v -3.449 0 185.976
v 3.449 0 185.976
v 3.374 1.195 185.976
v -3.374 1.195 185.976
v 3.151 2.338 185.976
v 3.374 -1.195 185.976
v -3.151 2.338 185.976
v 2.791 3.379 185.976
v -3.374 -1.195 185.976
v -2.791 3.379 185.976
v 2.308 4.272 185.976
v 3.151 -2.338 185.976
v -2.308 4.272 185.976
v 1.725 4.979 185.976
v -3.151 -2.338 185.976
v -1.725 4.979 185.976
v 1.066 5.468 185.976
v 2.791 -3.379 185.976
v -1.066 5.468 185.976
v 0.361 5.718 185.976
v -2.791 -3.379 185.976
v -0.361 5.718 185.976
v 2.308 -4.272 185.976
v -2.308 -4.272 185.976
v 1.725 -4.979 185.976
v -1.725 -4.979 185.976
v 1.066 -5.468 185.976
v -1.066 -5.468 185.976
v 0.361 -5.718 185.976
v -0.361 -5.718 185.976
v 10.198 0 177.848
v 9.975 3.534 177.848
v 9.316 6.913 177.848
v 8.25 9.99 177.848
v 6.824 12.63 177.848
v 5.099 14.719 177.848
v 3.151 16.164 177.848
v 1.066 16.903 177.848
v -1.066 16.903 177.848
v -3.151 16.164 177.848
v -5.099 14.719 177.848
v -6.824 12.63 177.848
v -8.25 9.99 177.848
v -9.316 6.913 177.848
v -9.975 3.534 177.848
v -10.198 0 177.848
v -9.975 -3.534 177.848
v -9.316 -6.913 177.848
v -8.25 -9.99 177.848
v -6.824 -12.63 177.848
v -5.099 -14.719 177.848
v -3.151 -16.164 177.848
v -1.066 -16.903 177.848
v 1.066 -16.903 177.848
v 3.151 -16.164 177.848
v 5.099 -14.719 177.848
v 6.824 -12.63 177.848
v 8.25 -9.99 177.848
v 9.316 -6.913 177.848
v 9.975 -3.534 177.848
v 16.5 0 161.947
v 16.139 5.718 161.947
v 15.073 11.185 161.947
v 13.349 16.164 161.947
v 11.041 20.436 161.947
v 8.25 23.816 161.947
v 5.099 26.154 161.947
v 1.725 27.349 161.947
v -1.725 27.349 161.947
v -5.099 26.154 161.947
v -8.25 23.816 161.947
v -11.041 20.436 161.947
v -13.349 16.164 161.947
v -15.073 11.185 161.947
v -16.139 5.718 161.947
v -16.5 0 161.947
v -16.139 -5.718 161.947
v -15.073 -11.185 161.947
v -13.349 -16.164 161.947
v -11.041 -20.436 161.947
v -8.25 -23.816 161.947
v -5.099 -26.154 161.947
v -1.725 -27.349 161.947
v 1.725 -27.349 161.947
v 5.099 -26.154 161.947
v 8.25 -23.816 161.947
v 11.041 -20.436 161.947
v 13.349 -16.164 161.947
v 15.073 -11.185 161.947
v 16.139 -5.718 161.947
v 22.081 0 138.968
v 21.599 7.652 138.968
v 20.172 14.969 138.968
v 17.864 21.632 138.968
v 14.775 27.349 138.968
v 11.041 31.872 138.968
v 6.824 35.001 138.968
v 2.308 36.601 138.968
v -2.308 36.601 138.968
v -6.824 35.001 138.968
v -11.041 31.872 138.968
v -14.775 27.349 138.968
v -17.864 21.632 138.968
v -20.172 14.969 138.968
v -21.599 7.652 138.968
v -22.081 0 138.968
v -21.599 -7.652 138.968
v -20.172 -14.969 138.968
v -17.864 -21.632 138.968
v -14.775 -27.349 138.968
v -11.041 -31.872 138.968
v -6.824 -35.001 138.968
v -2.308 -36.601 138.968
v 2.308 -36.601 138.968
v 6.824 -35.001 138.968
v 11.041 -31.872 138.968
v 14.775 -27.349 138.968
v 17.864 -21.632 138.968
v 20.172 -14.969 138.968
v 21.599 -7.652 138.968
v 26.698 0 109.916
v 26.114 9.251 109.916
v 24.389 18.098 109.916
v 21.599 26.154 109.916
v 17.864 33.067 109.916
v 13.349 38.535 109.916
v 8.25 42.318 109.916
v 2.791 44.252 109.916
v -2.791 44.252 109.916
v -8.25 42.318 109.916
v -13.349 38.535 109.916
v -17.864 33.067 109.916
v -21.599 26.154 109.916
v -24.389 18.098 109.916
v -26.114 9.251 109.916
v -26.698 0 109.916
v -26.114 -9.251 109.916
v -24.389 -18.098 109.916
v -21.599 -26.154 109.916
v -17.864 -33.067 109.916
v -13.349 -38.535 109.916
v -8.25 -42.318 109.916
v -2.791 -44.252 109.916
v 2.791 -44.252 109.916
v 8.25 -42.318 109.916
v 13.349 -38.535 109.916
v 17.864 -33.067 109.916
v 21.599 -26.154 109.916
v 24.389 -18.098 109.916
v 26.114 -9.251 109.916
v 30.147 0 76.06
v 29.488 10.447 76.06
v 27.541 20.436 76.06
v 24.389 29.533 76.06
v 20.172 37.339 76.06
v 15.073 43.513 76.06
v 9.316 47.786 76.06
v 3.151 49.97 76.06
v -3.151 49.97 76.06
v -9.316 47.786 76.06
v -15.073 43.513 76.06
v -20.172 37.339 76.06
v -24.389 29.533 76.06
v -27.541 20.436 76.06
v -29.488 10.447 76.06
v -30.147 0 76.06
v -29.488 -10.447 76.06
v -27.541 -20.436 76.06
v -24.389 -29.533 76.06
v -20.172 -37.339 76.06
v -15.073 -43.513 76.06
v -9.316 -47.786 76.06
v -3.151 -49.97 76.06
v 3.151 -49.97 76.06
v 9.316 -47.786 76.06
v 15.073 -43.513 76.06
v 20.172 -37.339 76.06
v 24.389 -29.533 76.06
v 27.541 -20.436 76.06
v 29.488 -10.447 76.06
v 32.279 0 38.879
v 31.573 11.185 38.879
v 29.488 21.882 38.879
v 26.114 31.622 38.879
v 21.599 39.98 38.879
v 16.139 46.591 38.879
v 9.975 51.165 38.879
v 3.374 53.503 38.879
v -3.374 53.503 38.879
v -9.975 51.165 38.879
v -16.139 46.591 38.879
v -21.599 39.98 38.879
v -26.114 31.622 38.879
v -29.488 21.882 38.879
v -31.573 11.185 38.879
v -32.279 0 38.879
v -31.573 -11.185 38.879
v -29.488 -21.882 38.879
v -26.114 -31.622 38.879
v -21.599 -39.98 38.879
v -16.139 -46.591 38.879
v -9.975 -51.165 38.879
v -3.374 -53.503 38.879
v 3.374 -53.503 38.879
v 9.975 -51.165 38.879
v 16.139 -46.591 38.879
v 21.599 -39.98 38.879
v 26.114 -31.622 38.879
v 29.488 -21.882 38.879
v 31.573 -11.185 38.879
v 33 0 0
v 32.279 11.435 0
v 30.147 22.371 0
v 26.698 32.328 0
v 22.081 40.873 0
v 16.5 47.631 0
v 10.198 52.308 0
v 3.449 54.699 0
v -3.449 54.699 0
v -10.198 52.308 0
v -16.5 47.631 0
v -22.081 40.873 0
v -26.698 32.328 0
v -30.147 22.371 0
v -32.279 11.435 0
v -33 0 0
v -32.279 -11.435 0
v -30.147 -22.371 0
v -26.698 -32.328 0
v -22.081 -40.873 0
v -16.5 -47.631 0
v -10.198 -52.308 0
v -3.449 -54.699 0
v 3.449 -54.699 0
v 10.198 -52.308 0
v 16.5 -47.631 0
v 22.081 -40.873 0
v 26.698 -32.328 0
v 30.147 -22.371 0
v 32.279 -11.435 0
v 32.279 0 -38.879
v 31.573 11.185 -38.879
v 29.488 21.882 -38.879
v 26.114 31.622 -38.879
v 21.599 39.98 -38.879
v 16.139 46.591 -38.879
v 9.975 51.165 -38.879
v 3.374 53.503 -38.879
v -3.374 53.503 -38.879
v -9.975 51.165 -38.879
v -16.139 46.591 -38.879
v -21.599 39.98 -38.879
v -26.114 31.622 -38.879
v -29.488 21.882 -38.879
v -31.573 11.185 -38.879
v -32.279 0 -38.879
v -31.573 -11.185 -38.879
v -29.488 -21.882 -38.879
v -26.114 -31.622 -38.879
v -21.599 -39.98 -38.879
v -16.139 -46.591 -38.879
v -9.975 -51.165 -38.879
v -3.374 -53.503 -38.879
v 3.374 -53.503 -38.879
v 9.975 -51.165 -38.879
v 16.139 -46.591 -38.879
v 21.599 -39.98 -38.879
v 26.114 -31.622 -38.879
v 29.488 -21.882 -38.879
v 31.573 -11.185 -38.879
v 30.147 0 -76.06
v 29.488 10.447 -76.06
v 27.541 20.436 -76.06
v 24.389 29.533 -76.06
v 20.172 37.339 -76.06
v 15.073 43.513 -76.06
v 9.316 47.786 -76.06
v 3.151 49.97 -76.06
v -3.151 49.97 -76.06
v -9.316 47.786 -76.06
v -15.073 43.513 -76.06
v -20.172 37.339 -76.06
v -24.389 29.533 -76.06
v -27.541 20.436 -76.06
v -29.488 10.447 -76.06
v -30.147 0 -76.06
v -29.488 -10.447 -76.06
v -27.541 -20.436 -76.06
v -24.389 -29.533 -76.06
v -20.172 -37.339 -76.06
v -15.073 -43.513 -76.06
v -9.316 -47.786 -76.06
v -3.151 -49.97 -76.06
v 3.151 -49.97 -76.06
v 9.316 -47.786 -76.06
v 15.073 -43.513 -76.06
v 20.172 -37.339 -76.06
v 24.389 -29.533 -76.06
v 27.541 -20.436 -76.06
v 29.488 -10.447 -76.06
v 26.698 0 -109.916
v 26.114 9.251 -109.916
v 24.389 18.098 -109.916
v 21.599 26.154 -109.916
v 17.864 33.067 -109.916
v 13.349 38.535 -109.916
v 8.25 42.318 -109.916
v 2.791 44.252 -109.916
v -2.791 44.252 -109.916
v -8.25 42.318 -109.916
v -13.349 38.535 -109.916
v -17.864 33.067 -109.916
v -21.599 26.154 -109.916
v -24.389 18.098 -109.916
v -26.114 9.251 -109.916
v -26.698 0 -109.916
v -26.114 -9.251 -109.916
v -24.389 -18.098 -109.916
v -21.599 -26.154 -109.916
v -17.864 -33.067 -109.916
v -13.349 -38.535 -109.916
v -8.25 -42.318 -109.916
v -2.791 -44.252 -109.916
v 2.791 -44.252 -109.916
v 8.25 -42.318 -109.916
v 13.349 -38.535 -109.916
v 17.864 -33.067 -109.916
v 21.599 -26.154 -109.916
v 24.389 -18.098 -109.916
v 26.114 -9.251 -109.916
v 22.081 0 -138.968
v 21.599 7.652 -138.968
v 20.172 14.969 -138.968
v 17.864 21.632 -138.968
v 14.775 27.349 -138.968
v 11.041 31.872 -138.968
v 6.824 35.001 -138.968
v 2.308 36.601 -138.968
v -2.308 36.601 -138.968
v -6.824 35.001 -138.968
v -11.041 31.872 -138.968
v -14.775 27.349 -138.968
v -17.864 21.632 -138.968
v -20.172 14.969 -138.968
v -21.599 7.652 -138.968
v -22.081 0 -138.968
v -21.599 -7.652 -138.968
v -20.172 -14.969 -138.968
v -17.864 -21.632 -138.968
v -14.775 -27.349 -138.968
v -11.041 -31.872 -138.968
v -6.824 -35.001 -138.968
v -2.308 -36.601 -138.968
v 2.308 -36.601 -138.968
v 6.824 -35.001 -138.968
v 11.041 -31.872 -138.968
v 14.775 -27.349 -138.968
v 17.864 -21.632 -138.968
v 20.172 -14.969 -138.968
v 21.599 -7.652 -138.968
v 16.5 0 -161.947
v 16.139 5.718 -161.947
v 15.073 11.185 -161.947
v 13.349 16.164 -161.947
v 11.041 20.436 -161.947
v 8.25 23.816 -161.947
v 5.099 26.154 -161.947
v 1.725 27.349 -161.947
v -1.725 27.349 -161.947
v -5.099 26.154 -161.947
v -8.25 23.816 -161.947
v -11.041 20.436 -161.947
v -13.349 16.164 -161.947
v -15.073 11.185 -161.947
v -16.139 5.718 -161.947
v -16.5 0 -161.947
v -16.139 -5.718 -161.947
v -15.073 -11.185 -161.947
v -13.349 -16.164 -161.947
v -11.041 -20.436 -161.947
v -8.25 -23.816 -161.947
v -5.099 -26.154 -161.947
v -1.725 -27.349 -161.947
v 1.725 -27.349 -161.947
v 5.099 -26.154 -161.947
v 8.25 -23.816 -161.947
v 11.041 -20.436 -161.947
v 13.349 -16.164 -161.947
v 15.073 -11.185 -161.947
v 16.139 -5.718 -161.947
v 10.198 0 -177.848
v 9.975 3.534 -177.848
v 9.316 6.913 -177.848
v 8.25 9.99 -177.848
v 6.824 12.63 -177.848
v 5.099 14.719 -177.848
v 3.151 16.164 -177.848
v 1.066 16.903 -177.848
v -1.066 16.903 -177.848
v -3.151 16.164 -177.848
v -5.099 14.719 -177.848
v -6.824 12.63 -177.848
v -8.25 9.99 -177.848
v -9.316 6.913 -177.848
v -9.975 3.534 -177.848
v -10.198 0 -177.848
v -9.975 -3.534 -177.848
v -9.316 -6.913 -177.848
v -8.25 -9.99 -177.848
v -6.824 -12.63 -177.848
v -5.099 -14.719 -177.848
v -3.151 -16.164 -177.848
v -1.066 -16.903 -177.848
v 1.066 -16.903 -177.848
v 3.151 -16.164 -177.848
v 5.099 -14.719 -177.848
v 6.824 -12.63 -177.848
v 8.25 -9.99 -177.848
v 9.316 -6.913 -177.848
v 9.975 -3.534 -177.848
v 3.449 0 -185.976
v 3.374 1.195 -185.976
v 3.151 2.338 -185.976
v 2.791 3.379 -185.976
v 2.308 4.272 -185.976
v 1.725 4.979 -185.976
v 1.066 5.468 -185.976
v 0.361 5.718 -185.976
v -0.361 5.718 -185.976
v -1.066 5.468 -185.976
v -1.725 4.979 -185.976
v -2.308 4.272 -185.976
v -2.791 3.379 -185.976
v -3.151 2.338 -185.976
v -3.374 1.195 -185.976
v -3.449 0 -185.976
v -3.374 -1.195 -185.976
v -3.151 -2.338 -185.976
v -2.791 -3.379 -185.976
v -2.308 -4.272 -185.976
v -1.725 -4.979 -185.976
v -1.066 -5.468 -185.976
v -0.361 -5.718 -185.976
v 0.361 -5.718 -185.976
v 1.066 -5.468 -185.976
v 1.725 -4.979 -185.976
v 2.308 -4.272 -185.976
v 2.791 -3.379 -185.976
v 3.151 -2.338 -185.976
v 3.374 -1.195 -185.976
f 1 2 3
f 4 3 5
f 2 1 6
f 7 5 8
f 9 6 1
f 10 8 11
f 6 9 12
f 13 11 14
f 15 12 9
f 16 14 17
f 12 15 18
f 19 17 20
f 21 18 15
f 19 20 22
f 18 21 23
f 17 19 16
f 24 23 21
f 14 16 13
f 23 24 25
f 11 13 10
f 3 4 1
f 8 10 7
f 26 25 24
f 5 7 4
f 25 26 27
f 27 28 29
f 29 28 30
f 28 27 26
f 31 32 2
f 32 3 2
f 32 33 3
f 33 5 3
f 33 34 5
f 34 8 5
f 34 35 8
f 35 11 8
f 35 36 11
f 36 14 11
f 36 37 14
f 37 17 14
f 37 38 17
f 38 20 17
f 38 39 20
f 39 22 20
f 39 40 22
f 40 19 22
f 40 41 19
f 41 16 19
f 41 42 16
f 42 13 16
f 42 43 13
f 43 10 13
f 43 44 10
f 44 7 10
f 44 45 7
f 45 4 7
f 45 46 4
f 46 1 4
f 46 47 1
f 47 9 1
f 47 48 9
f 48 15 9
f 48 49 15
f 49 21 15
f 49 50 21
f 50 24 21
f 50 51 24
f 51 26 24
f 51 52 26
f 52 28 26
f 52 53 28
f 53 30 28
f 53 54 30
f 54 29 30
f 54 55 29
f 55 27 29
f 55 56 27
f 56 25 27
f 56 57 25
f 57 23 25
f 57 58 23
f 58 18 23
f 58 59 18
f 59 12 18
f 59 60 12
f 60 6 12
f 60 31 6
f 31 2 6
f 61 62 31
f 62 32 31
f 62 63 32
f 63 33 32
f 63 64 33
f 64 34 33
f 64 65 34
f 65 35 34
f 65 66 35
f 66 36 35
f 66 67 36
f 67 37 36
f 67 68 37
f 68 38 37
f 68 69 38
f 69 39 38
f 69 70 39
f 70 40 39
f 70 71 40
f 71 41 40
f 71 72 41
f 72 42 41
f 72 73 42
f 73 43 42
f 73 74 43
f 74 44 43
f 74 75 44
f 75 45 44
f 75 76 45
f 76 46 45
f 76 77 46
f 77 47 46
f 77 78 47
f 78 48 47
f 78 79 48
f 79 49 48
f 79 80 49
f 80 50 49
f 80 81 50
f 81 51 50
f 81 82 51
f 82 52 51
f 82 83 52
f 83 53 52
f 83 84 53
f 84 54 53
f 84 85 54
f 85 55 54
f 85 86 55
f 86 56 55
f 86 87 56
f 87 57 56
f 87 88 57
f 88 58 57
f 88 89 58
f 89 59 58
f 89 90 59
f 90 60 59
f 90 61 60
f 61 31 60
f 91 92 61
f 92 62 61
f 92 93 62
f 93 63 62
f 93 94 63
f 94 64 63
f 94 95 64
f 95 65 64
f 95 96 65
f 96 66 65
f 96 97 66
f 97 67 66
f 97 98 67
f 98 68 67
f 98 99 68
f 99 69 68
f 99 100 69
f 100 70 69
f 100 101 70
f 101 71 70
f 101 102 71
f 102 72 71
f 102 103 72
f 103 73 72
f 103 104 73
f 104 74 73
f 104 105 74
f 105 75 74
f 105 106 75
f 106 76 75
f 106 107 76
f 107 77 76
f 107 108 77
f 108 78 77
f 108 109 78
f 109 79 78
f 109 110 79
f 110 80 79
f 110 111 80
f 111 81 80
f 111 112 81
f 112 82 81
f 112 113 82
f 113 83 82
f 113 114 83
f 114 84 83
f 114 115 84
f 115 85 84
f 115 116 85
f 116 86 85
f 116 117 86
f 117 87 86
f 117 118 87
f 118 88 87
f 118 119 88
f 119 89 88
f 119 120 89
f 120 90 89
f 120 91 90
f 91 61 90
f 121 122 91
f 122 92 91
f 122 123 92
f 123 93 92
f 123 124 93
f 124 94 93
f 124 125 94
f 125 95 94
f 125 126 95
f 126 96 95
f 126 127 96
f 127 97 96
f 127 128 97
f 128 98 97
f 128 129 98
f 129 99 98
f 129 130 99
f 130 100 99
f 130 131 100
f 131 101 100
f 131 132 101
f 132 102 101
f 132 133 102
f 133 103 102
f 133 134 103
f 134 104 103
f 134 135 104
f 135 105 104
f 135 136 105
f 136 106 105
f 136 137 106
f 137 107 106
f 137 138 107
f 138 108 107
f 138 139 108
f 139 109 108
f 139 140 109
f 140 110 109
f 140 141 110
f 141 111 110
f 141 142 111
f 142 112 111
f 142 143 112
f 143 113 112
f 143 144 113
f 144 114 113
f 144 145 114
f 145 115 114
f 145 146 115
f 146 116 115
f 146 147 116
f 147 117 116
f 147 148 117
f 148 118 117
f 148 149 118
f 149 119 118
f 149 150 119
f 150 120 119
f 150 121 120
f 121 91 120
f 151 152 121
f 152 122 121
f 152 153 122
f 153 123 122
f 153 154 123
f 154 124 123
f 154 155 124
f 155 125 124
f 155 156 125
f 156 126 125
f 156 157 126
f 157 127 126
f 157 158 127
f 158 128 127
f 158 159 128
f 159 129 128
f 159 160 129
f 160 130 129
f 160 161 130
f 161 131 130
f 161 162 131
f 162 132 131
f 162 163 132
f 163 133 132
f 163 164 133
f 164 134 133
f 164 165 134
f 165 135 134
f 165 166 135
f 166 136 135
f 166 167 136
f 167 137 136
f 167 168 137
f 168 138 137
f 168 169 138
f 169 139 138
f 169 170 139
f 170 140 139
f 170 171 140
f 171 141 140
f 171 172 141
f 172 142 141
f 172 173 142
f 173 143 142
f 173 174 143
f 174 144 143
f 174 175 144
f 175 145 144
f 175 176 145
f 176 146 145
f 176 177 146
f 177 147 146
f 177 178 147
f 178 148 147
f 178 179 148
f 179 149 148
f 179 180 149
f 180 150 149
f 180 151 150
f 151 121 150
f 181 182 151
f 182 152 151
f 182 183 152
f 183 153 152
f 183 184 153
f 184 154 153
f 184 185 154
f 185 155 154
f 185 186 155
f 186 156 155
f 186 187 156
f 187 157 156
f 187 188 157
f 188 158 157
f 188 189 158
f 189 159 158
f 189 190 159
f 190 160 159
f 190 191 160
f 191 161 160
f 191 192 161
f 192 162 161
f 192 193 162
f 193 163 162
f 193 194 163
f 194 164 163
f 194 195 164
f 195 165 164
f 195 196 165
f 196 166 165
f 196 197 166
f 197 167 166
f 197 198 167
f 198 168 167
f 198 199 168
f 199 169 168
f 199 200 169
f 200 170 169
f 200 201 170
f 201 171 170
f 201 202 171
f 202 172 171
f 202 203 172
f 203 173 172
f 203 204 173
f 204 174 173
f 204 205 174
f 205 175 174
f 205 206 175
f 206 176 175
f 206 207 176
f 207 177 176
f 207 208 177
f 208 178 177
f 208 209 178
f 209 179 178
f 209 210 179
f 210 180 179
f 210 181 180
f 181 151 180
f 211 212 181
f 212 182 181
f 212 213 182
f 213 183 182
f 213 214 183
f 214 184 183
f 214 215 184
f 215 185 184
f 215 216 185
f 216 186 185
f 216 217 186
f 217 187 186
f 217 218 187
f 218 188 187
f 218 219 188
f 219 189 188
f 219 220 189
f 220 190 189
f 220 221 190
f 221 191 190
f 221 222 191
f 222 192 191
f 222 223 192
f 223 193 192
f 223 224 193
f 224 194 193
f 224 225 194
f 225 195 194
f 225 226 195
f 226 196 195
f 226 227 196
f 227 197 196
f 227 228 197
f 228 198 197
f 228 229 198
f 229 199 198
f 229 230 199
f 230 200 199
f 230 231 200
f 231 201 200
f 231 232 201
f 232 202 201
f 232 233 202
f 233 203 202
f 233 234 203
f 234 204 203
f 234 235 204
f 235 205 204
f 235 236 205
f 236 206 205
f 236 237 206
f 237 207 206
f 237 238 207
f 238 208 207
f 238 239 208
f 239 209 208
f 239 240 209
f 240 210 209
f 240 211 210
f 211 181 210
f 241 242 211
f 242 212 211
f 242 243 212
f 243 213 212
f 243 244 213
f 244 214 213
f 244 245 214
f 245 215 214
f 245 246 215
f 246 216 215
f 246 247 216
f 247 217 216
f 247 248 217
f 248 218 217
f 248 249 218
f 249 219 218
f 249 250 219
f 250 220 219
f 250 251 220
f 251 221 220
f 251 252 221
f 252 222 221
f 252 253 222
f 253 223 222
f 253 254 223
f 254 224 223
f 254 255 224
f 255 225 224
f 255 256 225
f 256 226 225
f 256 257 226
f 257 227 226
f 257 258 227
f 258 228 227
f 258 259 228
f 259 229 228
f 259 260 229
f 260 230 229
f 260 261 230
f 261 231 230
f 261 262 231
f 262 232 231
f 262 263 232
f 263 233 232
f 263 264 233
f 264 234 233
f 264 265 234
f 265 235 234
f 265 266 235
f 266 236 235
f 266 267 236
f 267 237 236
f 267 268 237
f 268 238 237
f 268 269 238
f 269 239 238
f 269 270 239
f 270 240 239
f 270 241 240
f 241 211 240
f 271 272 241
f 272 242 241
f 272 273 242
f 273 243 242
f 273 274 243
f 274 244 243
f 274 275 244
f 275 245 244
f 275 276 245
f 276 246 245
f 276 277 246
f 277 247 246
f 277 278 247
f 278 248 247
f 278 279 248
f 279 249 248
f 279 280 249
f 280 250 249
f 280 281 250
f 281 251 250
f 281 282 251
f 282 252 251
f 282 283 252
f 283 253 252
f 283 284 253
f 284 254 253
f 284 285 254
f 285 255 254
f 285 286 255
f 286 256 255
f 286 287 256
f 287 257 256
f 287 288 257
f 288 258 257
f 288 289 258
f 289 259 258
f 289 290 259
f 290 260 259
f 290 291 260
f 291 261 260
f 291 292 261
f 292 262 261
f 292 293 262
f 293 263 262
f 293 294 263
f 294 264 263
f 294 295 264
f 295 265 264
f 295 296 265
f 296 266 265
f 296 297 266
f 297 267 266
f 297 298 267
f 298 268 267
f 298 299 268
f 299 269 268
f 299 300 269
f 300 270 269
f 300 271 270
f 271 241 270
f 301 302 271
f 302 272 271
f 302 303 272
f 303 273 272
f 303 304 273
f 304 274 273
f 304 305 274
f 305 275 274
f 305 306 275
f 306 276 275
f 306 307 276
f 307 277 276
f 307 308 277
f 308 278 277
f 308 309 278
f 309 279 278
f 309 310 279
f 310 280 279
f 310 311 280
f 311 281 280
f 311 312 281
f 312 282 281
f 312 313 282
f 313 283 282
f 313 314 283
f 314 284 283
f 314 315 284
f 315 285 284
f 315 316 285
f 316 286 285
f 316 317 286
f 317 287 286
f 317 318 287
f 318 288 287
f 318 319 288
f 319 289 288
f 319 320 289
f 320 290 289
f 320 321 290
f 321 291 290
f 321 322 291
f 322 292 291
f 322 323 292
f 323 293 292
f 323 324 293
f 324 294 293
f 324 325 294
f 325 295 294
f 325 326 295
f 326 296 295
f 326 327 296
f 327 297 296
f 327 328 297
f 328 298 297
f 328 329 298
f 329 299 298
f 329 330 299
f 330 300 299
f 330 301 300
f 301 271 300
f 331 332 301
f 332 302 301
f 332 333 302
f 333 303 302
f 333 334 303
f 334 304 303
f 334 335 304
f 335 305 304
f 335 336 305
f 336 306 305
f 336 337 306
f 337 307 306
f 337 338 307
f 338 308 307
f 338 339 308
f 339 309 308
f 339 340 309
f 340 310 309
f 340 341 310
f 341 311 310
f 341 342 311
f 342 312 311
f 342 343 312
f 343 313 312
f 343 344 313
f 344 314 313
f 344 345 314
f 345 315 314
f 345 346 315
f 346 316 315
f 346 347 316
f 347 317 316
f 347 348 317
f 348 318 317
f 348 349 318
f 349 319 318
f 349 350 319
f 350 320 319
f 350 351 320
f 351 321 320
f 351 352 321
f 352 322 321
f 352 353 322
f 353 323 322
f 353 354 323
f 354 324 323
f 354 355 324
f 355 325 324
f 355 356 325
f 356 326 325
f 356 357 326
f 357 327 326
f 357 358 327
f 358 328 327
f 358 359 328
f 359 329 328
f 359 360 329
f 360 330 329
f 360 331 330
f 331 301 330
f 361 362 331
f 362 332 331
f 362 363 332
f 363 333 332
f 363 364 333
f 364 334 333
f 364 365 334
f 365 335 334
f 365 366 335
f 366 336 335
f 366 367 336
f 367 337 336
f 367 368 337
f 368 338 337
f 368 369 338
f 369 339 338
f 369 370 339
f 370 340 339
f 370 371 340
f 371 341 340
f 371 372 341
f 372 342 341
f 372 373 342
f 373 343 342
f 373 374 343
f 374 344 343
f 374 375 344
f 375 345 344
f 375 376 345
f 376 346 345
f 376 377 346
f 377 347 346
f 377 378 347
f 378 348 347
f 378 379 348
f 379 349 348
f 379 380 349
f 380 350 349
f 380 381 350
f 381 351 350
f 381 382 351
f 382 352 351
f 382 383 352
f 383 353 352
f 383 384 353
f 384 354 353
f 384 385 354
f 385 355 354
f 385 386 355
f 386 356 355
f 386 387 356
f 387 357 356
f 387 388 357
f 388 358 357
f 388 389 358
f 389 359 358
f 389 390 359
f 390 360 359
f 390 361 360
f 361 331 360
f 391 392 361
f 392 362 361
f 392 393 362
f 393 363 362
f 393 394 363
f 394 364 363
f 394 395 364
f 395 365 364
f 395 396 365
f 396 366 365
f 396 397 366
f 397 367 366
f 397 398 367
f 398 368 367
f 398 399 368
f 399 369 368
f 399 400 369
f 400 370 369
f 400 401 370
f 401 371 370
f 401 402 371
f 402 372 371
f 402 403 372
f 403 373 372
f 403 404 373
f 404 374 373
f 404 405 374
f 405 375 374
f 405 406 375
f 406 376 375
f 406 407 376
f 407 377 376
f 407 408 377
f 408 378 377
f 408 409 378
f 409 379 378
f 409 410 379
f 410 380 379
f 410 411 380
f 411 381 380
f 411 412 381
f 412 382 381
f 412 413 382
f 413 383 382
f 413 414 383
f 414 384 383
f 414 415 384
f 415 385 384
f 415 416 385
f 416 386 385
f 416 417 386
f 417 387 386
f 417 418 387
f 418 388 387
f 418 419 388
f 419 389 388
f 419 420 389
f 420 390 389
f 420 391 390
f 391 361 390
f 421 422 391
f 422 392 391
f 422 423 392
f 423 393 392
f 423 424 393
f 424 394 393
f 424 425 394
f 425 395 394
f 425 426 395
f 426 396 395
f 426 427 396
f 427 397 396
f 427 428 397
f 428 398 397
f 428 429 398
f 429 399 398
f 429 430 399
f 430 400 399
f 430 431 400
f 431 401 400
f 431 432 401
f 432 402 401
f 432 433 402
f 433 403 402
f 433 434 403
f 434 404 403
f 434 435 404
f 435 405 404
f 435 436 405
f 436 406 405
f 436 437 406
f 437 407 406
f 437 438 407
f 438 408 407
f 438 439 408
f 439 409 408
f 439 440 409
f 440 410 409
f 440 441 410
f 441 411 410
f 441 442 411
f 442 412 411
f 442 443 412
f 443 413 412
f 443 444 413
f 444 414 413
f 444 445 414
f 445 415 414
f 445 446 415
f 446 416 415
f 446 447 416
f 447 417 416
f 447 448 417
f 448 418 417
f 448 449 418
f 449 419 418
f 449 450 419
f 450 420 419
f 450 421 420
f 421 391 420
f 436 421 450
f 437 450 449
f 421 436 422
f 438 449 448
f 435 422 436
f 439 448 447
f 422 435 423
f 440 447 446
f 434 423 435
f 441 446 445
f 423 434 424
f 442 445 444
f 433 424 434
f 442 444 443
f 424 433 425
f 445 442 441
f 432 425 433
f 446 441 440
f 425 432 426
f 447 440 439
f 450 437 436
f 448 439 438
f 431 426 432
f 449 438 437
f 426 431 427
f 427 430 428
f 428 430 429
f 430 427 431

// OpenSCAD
// Generated by SolidPython 1.0.1 on 2020-07-29 00:46:45


scale(v = [3, 5, 17]) {
	sphere(r = 11);
}
/***********************************************
*********      SolidPython code:      **********
************************************************
 
# import packages: SolidPython
from solid import *
from solid.utils import *
from itertools import chain, combinations, permutations


class Resize:

    def __init__(self, scad_file):
        self.scad_file = scad_file
        #self.scad_file = import_scad(scad_file)
        # cone/cylinder param:
        self.r1 = 0
        self.r2 = 0
        self.h = 0
        # rectangular prism param:
        self.w = 0
        self.l = 0
        # ellipse param:
        self.r = 0

    # import OpenScad code (file name corresponds to shape)


    # classify shape + parameters
    def assign(self, param1, param2, param3):
        if self.scad_file == 'cone.scad':
            self.r1 = param1
            self.r2 = param2
            self.h = param3
        elif self.scad_file == 'cylinder.scad':
            self.r1 = param1
            self.r2 = param2
            self.h = param3
        elif self.scad_file == 'rectangularPrism.scad':
            self.h = param1
            self.l = param2
            self.w = param3
        else:
            self.r = param1
            self.h = param2

    # resize parameters
    def iterate(self):
        x = range(3, 20, 2)
        i = 1
        if self.scad_file == 'cone.scad':
            tempList = list(permutations(x, 2))
            for temp in tempList:
                param1 = temp[0]
                param2 = temp[1]
                filepath = 'produced_scad_files/' + 'cone' + str(param1) + '_' + str(param2) + '_' + '.scad'
                scad_render_to_file(cylinder(h=param1, r1=param2, r2=0), filepath)

        elif self.scad_file == 'cylinder.scad':
            tempList = list(permutations(x, 3))
            for temp in tempList:
                param1 = temp[0]
                param2 = temp[1]
                filepath = 'produced_scad_files/' + 'cylinder' + str(param1) + '_' + str(param2) + '_' + '.scad'
                scad_render_to_file(cylinder(h=param1, r1=param2, r2=param2), filepath)

        elif self.scad_file == 'rectangularPrism.scad':
            tempList = list(permutations(x, 3))
            for temp in tempList:
                param1 = temp[0]
                param2 = temp[1]
                param3 = temp[2]
                filepath = 'produced_scad_files/' + 'rectangularPrism' + str(param1) + '_' + str(param2) + '_' + str(
                    param3) + '.scad'
                scad_render_to_file(cube(size=(param1, param2, param3)), filepath)

        elif self.scad_file == 'ellipse.scad':
            tempList = list(permutations(x, 4))
            for temp in tempList:
                param1 = temp[0]
                param2 = temp[1]
                param3 = temp[2]
                param4 = temp[3]
                filepath = 'produced_scad_files/' + 'ellipse' + str(param1) + '_' + str(param2) + '_' + str(param3) + '_' + str(param4) + '.scad'
                scad_render_to_file(scale([param1, param2, param3])(sphere(r=param4)), filepath)

    def render_to_scadfile(self):
        scad_render_to_file(scad, 'example.scad') 
 
************************************************/
